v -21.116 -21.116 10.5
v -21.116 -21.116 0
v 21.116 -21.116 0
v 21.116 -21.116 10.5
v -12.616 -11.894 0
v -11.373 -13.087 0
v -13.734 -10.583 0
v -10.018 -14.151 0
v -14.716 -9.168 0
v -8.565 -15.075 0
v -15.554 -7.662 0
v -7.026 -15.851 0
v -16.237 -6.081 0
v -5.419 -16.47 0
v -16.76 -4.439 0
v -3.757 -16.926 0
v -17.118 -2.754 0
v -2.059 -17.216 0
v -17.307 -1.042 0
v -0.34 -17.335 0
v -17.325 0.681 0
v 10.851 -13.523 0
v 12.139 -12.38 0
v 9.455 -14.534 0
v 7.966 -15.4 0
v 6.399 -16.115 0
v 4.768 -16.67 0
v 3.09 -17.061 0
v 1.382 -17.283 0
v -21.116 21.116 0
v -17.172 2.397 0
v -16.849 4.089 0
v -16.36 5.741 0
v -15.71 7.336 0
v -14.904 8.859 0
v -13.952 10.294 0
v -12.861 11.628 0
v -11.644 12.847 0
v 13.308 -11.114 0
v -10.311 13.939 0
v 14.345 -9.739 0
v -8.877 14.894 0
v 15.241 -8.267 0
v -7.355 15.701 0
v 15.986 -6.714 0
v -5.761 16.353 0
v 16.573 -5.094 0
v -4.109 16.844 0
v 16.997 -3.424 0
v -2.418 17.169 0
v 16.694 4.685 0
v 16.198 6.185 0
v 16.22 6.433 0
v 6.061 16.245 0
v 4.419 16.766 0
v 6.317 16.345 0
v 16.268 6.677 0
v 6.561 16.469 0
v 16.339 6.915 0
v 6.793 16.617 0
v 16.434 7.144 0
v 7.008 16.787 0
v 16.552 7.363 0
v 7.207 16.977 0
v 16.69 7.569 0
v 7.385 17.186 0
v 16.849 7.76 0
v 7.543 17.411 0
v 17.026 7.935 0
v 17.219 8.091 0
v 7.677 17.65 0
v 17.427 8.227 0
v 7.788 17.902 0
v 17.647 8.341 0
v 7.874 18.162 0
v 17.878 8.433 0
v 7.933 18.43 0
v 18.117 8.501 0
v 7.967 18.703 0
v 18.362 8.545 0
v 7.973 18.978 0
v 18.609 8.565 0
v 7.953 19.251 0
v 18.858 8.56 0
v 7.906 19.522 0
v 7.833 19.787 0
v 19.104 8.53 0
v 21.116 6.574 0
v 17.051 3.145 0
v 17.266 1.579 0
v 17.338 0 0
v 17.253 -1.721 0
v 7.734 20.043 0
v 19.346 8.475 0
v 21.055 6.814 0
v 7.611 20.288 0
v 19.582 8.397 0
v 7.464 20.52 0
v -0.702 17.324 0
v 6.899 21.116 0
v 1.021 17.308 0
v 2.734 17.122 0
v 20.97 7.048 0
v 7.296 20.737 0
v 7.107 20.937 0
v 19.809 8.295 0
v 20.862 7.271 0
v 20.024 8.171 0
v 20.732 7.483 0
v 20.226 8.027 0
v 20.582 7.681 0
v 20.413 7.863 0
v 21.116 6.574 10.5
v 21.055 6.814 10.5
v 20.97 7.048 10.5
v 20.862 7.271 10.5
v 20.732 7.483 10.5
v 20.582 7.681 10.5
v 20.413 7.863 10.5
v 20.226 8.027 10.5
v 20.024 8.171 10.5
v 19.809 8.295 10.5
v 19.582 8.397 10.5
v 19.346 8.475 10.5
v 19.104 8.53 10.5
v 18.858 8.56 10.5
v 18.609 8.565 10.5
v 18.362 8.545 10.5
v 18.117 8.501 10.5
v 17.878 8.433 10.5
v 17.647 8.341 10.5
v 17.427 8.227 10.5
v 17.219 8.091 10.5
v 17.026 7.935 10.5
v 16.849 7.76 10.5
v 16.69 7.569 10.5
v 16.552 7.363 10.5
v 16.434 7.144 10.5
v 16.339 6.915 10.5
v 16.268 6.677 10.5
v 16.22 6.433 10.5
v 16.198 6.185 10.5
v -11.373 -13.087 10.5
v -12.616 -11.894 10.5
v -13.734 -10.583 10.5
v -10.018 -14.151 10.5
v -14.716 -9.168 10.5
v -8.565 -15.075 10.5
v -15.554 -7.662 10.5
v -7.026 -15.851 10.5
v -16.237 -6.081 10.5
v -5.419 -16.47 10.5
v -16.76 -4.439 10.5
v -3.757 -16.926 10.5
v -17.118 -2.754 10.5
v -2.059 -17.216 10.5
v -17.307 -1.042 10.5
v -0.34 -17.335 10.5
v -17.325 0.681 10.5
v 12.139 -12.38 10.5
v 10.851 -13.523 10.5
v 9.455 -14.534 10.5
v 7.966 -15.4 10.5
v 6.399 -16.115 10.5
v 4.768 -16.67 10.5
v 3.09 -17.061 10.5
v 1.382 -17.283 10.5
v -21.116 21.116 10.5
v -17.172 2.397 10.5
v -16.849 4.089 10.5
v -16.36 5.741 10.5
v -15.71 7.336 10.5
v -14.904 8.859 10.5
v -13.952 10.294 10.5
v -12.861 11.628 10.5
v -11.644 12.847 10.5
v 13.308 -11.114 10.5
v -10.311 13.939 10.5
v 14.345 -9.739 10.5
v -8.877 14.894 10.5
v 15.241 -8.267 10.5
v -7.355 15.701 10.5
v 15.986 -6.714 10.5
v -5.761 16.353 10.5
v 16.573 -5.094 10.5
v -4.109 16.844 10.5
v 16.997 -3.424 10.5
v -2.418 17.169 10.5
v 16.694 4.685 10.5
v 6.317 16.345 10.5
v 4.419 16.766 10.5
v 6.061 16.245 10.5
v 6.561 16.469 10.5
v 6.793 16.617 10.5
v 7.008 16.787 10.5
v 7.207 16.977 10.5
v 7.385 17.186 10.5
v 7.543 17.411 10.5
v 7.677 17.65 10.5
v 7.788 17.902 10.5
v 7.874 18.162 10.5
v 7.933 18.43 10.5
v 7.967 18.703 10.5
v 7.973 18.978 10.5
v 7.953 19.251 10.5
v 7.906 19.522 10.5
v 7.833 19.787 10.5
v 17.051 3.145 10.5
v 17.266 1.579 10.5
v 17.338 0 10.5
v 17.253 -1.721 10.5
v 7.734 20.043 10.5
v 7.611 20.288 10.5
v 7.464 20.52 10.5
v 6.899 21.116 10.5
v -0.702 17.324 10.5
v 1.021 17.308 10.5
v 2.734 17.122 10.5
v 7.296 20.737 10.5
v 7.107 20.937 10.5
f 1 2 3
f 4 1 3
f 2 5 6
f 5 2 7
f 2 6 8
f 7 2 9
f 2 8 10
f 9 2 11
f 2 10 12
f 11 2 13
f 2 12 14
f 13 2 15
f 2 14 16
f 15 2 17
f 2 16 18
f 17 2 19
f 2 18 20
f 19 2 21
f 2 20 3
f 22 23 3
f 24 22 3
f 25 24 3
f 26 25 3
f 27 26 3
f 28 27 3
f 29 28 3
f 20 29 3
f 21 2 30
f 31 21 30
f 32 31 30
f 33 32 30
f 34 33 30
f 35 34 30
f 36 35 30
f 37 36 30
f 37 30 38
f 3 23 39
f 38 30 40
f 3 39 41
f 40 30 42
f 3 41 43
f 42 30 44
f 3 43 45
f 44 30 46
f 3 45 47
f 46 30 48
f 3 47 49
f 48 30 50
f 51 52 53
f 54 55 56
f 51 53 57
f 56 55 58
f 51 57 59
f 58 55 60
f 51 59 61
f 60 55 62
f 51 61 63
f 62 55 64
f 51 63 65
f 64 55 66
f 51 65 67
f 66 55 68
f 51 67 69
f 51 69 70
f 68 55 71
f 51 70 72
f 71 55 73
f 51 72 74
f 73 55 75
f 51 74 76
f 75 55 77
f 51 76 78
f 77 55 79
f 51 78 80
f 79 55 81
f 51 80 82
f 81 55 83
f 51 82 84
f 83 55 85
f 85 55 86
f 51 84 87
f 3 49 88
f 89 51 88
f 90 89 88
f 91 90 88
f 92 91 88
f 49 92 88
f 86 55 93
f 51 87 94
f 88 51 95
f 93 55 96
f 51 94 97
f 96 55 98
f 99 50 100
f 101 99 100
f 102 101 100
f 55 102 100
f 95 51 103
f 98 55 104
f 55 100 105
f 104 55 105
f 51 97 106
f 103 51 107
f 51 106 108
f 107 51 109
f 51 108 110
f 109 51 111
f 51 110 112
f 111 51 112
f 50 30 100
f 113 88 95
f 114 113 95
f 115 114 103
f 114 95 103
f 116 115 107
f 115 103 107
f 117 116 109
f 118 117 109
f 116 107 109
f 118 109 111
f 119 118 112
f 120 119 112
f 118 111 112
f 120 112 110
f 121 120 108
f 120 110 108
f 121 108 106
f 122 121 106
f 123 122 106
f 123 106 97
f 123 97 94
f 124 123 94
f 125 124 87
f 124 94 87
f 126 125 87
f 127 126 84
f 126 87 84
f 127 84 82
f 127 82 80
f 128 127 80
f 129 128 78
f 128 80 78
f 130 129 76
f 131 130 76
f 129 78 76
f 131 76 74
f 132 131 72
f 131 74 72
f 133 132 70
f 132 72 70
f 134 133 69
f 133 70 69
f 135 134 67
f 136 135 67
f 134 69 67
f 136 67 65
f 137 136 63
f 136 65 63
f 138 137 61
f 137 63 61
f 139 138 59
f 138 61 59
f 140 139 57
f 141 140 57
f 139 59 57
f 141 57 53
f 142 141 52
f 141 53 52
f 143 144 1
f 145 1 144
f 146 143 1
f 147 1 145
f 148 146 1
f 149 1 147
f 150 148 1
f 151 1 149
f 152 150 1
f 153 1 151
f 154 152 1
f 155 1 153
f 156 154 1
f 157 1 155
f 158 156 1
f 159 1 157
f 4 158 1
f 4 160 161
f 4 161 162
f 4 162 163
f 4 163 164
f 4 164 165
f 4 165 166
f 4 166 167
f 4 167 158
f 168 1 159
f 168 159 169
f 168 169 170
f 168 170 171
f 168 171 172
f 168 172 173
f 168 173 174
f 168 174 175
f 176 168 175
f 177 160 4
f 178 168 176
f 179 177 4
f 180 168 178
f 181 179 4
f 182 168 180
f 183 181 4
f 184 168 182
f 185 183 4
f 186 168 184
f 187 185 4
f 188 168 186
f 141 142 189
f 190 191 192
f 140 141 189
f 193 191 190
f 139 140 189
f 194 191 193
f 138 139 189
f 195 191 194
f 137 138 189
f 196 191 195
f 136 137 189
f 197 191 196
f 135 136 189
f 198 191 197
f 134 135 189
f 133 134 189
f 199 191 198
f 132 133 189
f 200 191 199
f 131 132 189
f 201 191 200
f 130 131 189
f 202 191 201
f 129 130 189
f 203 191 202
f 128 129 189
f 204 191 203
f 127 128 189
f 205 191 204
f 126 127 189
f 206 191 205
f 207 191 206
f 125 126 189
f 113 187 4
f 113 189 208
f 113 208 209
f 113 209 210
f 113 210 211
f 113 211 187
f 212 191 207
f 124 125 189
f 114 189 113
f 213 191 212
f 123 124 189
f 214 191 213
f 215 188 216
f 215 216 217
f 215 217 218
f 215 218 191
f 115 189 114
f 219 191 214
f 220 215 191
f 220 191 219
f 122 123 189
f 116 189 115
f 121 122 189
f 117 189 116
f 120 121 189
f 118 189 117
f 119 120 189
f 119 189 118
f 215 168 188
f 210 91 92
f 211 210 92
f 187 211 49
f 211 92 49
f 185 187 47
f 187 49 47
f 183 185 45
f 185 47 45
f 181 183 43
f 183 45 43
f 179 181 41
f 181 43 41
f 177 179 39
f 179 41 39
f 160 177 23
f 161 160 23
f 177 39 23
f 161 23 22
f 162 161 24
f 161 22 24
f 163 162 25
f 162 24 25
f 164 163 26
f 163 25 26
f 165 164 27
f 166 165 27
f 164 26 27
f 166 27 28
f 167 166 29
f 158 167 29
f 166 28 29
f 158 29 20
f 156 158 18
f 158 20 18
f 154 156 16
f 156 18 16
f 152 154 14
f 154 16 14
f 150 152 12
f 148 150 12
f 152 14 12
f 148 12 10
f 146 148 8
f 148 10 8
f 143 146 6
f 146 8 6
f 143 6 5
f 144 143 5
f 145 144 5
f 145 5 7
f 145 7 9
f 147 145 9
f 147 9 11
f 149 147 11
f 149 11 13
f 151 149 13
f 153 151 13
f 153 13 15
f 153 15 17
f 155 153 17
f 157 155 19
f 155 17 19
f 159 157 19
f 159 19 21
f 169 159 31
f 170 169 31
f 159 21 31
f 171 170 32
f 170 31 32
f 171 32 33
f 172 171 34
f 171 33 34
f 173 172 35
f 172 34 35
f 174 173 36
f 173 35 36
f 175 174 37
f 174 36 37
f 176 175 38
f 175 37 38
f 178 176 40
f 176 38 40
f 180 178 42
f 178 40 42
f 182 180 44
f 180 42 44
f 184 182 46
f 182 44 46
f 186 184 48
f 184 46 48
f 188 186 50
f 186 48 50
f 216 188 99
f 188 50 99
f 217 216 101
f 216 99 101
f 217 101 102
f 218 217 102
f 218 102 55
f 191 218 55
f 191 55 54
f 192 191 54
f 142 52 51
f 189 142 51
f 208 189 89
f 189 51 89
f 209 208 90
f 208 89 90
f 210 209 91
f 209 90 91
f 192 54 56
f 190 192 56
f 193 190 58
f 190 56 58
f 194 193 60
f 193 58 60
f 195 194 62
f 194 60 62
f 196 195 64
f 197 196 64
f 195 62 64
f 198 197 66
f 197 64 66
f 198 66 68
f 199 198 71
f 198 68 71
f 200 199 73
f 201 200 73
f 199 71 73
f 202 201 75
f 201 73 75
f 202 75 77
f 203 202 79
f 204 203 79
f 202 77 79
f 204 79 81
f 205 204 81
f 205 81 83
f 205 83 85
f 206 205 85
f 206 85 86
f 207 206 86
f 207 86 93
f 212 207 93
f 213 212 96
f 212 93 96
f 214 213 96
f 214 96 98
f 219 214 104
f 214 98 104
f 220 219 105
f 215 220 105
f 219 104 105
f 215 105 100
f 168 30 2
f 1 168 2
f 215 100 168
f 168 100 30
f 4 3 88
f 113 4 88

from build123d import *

# Parameters (mm, degrees)
F1_DEPTH = 10.5


with BuildPart() as f1:
    # F0 (on Top) → F1 (new body)
    with BuildSketch(Plane.XY):
        with BuildLine():
            ThreePointArc((6.061135, 16.244531), (7.933277, 18.430479), (6.899406, 21.116441))
            Line((6.899406, 21.116441), (-21.116441, 21.116441))
            Line((-21.116441, 21.116441), (-21.116441, -21.116441))
            Line((-21.116441, -21.116441), (21.116441, -21.116441))
            Line((21.116441, -21.116441), (21.116441, 6.573539))
            ThreePointArc((21.116441, 6.573539), (18.485123, 8.558267), (16.1976, 6.18546))
            ThreePointArc((16.1976, 6.18546), (17.050859, 3.144896), (17.338459, 0))
            ThreePointArc((17.338459, 0), (-14.242768, -9.887654), (6.061135, 16.244531))
        make_face()
    extrude(amount=F1_DEPTH)


solid = f1.part
